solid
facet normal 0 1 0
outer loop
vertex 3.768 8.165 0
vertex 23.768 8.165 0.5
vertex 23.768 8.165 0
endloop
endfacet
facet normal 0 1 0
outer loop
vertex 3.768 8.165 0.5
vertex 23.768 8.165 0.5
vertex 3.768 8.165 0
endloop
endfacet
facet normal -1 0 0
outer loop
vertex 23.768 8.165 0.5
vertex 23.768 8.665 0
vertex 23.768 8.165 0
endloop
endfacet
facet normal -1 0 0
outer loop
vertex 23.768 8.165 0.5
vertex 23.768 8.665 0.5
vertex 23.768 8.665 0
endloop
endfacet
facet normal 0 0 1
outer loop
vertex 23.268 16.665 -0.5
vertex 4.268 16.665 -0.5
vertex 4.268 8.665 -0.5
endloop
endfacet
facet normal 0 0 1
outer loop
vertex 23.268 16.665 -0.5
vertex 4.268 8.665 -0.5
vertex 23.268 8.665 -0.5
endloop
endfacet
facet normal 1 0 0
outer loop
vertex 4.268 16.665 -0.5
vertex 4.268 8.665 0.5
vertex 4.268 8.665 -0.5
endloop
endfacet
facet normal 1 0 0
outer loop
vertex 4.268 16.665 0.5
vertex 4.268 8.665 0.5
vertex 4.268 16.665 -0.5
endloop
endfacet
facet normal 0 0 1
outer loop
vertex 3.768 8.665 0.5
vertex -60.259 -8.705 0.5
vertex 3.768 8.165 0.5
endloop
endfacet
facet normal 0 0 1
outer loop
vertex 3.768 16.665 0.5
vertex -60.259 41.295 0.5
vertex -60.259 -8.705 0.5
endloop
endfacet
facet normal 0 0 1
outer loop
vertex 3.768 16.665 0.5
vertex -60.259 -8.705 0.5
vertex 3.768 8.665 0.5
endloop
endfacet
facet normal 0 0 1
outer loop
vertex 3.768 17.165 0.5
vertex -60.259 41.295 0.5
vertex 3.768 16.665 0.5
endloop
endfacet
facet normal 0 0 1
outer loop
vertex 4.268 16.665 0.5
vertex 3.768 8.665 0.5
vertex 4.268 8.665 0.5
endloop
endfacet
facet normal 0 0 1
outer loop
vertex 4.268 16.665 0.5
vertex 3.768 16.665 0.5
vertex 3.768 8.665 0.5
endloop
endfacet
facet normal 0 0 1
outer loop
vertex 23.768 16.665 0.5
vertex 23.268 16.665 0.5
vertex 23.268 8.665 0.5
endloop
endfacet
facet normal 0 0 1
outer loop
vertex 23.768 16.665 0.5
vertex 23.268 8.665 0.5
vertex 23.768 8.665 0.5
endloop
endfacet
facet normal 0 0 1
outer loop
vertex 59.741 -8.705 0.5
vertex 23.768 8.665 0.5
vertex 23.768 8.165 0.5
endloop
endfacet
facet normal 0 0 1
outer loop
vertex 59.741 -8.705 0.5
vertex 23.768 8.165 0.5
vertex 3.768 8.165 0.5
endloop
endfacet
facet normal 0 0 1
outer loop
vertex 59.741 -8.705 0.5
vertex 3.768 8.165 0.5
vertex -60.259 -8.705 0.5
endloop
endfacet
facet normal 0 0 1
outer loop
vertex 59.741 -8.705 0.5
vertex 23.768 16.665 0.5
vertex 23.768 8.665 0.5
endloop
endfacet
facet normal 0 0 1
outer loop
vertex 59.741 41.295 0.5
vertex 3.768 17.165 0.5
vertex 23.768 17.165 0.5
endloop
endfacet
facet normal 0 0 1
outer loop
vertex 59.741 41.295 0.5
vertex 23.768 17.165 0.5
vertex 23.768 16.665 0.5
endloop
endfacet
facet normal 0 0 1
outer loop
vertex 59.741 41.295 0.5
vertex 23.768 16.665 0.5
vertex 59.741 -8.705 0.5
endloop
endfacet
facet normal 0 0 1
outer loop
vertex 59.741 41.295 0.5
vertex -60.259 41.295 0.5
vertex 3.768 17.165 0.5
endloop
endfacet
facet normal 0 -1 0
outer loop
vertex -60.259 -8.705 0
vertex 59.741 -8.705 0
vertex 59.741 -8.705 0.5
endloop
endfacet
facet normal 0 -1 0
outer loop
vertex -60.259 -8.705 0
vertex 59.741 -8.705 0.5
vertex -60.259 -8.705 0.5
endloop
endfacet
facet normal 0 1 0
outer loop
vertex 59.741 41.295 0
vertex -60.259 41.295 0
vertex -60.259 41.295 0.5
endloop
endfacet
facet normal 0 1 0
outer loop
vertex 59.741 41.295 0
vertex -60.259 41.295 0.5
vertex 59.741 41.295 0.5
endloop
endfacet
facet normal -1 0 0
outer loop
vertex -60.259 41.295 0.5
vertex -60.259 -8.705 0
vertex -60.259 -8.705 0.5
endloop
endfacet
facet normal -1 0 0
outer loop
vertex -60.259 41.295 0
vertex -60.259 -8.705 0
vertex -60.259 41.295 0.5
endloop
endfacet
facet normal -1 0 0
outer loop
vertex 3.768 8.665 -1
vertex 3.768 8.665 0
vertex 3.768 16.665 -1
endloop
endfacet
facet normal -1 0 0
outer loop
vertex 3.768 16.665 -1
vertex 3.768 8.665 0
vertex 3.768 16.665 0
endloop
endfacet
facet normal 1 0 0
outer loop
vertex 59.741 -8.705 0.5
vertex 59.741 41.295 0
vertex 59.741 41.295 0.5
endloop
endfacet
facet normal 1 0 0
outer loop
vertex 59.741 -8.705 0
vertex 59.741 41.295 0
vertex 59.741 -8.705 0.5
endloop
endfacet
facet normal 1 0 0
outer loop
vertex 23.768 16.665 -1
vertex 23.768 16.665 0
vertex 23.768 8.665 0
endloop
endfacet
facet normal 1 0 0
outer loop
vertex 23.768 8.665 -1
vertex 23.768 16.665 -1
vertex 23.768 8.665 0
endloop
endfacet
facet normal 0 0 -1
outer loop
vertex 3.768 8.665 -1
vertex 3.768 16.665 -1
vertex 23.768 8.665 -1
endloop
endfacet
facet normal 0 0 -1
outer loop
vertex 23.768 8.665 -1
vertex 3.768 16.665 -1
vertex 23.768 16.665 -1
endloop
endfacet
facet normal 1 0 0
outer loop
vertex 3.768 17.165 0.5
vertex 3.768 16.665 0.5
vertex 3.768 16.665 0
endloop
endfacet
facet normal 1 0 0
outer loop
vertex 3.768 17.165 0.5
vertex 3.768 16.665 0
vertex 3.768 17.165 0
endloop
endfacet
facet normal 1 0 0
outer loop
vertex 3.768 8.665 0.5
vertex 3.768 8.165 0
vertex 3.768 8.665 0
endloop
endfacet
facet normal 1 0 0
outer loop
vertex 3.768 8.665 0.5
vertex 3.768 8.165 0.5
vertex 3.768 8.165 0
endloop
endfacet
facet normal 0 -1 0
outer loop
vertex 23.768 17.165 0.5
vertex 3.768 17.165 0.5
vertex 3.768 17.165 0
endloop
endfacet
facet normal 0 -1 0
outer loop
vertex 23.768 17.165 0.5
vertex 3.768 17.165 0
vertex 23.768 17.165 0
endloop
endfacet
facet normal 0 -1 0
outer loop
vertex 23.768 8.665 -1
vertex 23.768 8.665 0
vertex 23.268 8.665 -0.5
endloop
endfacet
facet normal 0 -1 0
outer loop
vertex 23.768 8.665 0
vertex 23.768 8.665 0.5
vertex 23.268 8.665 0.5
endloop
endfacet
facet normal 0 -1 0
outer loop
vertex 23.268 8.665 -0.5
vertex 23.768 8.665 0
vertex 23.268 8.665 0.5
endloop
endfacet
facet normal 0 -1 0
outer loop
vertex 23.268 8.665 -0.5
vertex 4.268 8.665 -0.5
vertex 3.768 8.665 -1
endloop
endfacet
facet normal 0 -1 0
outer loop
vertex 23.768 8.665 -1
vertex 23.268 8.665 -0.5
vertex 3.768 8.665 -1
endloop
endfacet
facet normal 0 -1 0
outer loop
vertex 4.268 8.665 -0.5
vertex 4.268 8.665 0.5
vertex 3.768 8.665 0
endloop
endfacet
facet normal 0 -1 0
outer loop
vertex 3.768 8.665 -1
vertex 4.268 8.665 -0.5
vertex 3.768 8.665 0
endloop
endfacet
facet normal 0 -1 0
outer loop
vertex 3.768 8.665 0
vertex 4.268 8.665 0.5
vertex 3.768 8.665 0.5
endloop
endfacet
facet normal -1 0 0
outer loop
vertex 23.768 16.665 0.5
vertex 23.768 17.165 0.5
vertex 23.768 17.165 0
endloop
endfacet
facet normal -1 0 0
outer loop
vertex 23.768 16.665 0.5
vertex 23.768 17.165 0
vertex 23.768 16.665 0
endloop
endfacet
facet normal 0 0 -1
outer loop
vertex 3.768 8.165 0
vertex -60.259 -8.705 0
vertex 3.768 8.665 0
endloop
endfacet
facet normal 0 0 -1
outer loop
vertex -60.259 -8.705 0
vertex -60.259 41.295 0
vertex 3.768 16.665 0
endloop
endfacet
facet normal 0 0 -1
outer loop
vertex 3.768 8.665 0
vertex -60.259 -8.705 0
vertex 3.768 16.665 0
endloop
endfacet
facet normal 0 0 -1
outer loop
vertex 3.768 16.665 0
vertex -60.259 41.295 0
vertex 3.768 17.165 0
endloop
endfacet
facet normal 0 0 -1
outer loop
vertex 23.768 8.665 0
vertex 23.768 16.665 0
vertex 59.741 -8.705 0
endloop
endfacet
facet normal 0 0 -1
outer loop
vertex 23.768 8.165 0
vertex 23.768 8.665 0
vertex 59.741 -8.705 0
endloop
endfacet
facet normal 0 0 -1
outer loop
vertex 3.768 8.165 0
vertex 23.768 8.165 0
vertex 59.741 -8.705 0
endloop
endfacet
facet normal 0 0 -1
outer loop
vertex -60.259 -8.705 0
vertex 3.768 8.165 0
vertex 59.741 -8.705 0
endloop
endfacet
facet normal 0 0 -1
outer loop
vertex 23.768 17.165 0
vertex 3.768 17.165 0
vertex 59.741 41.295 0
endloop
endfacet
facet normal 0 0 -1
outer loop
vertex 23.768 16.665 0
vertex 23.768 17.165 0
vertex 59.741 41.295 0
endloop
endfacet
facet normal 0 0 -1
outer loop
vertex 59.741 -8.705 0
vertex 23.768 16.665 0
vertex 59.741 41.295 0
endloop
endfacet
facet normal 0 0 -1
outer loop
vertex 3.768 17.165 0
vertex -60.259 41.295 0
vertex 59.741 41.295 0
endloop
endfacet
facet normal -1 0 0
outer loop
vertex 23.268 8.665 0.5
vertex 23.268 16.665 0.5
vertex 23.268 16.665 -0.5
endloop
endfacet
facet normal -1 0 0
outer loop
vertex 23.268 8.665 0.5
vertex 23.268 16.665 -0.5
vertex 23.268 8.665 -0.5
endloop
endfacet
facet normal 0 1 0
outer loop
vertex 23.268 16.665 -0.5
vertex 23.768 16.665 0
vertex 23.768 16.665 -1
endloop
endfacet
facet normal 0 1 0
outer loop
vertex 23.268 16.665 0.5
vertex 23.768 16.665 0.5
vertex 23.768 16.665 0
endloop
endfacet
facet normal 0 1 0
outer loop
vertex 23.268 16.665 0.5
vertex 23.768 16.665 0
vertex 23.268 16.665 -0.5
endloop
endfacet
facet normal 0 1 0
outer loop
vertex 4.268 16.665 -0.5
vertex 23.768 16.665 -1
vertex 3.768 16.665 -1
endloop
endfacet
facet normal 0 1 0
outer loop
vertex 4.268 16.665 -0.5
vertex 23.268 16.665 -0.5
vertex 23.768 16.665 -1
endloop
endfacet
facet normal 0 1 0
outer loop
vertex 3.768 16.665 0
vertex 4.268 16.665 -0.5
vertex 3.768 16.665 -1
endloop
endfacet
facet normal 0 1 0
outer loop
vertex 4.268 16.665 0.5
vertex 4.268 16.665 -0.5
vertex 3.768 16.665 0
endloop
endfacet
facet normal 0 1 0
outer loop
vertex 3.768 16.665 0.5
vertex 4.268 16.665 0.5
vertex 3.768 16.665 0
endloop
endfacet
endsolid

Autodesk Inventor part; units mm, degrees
ref_plane "YZ Plane" through (0, 0, 0) normal (1, 0, 0) x (0, 1, 0)
ref_plane "XZ Plane" through (0, 0, 0) normal (0, 1, 0) x (-1, 0, 0)
ref_plane "XY Plane" through (0, 0, 0) normal (0, 0, 1) x (1, 0, 0)
sketch "Sketch1" plane through (0, 0, 0) normal (0, 0, 1) x (1, 0, 0)
  line L0 (-60.259, 41.2953) -> (59.741, 41.2953)
  line L1 (59.741, 41.2953) -> (59.741, -8.7047)
  line L2 (59.741, -8.7047) -> (-60.259, -8.7047)
  line L3 (-60.259, -8.7047) -> (-60.259, 41.2953)
  dimension "d0" = 120
  dimension "d1" = 50
extrude "Plate1" add sketch "Sketch1" along normal blind 0.5
sketch "Sketch2" plane through (0, 0, 0.5) normal (0, 0, 1) x (1, 0, 0)
  line L0 (3.7677, 16.6653) -> (23.7677, 16.6653)
  line L1 (23.7677, 16.6653) -> (23.7677, 8.6653)
  line L2 (23.7677, 8.6653) -> (3.7677, 8.6653)
  line L3 (3.7677, 8.6653) -> (3.7677, 16.6653)
  point P0 (13.7677, 12.6653)
  point P1 (13.7677, 12.6653)
  dimension "LG_G" = 20
  dimension "LT_G" = 8
  dimension "d5" = 10
  dimension "d6" = 4
extrude "Extrusion1" add sketch "Sketch2" against normal blind 1.5
sketch "Sketch3" plane through (0, 0, 0.5) normal (0, 0, 1) x (1, 0, 0)
  line L0 (3.7677, 16.6653) -> (23.7677, 16.6653) projected
  line L1 (3.7677, 8.6653) -> (3.7677, 16.6653) projected
  line L2 (23.7677, 8.6653) -> (3.7677, 8.6653) projected
  line L3 (23.7677, 16.6653) -> (23.7677, 8.6653) projected
  line L4 (4.2677, 16.6653) -> (23.2677, 16.6653)
  line L5 (23.2677, 16.6653) -> (23.2677, 8.6653)
  line L6 (23.2677, 8.6653) -> (4.2677, 8.6653)
  line L7 (4.2677, 8.6653) -> (4.2677, 16.6653)
  dimension "d9" = 0.5
  dimension "d10" = 0.5
extrude "Extrusion2" cut sketch "Sketch3" against normal blind 1 contours L0 L5 L2 L7
sketch "Sketch4" plane through (0, 0, 0.5) normal (0, 0, 1) x (1, 0, 0)
  line L0 (4.2677, 16.6653) -> (23.2677, 16.6653) projected
  line L1 (23.2677, 8.6653) -> (4.2677, 8.6653) projected
  line L2 (4.2677, 16.6653) -> (23.2677, 16.6653) projected
  line L3 (4.2677, 8.6653) -> (4.2677, 16.6653) projected
  line L4 (23.2677, 8.6653) -> (4.2677, 8.6653) projected
  line L5 (23.2677, 16.6653) -> (23.2677, 8.6653) projected
  line L6 (3.7677, 17.1653) -> (23.7677, 17.1653)
  line L7 (23.7677, 17.1653) -> (23.7677, 16.6653)
  line L8 (23.7677, 16.6653) -> (3.7677, 16.6653)
  line L9 (3.7677, 16.6653) -> (3.7677, 17.1653)
  line L10 (3.7677, 8.6653) -> (23.7677, 8.6653)
  line L11 (23.7677, 8.6653) -> (23.7677, 8.1653)
  line L12 (23.7677, 8.1653) -> (3.7677, 8.1653)
  line L13 (3.7677, 8.1653) -> (3.7677, 8.6653)
  dimension "d13" = 0.5
  dimension "d14" = 0.5
  dimension "d15" = 0.5
  dimension "d16" = 0.5
extrude "Cut1" cut sketch "Sketch4" against normal blind 0.5 contours L8 L9 L6 L7 L0 | L1 L10 L11 L12 L13
equation "\"d5\" = 0.5 * LG_G"
equation "\"d6\" = 0.5 * LT_G"
equation "\"d7\" = 3 * Thickness"
equation "\"d9\" = Thickness"
equation "\"d10\" = Thickness"
equation "\"d11\" = 2 * Thickness"
equation "\"d13\" = Thickness"
equation "\"d14\" = Thickness"
equation "\"d15\" = Thickness"
equation "\"d16\" = Thickness"
equation "\"d17\" = Thickness"
equation "\"d2\" = Thickness"
equation "\"BendRadius\" = Thickness"
equation "\"BendReliefWidth\" = Thickness"
equation "\"BendReliefDepth\" = 0.5 * Thickness"
equation "\"CornerReliefSize\" = 4 * Thickness"
equation "\"MinimumRemnant\" = 2 * Thickness"
equation "\"TransitionRadius\" = BendRadius"
equation "\"JacobiRadiusSize\" = BendRadius"
equation "\"GapSize\" = Thickness"
equation "\"Thickness\" = 0.5"
properties part number "Ambutisare1"
